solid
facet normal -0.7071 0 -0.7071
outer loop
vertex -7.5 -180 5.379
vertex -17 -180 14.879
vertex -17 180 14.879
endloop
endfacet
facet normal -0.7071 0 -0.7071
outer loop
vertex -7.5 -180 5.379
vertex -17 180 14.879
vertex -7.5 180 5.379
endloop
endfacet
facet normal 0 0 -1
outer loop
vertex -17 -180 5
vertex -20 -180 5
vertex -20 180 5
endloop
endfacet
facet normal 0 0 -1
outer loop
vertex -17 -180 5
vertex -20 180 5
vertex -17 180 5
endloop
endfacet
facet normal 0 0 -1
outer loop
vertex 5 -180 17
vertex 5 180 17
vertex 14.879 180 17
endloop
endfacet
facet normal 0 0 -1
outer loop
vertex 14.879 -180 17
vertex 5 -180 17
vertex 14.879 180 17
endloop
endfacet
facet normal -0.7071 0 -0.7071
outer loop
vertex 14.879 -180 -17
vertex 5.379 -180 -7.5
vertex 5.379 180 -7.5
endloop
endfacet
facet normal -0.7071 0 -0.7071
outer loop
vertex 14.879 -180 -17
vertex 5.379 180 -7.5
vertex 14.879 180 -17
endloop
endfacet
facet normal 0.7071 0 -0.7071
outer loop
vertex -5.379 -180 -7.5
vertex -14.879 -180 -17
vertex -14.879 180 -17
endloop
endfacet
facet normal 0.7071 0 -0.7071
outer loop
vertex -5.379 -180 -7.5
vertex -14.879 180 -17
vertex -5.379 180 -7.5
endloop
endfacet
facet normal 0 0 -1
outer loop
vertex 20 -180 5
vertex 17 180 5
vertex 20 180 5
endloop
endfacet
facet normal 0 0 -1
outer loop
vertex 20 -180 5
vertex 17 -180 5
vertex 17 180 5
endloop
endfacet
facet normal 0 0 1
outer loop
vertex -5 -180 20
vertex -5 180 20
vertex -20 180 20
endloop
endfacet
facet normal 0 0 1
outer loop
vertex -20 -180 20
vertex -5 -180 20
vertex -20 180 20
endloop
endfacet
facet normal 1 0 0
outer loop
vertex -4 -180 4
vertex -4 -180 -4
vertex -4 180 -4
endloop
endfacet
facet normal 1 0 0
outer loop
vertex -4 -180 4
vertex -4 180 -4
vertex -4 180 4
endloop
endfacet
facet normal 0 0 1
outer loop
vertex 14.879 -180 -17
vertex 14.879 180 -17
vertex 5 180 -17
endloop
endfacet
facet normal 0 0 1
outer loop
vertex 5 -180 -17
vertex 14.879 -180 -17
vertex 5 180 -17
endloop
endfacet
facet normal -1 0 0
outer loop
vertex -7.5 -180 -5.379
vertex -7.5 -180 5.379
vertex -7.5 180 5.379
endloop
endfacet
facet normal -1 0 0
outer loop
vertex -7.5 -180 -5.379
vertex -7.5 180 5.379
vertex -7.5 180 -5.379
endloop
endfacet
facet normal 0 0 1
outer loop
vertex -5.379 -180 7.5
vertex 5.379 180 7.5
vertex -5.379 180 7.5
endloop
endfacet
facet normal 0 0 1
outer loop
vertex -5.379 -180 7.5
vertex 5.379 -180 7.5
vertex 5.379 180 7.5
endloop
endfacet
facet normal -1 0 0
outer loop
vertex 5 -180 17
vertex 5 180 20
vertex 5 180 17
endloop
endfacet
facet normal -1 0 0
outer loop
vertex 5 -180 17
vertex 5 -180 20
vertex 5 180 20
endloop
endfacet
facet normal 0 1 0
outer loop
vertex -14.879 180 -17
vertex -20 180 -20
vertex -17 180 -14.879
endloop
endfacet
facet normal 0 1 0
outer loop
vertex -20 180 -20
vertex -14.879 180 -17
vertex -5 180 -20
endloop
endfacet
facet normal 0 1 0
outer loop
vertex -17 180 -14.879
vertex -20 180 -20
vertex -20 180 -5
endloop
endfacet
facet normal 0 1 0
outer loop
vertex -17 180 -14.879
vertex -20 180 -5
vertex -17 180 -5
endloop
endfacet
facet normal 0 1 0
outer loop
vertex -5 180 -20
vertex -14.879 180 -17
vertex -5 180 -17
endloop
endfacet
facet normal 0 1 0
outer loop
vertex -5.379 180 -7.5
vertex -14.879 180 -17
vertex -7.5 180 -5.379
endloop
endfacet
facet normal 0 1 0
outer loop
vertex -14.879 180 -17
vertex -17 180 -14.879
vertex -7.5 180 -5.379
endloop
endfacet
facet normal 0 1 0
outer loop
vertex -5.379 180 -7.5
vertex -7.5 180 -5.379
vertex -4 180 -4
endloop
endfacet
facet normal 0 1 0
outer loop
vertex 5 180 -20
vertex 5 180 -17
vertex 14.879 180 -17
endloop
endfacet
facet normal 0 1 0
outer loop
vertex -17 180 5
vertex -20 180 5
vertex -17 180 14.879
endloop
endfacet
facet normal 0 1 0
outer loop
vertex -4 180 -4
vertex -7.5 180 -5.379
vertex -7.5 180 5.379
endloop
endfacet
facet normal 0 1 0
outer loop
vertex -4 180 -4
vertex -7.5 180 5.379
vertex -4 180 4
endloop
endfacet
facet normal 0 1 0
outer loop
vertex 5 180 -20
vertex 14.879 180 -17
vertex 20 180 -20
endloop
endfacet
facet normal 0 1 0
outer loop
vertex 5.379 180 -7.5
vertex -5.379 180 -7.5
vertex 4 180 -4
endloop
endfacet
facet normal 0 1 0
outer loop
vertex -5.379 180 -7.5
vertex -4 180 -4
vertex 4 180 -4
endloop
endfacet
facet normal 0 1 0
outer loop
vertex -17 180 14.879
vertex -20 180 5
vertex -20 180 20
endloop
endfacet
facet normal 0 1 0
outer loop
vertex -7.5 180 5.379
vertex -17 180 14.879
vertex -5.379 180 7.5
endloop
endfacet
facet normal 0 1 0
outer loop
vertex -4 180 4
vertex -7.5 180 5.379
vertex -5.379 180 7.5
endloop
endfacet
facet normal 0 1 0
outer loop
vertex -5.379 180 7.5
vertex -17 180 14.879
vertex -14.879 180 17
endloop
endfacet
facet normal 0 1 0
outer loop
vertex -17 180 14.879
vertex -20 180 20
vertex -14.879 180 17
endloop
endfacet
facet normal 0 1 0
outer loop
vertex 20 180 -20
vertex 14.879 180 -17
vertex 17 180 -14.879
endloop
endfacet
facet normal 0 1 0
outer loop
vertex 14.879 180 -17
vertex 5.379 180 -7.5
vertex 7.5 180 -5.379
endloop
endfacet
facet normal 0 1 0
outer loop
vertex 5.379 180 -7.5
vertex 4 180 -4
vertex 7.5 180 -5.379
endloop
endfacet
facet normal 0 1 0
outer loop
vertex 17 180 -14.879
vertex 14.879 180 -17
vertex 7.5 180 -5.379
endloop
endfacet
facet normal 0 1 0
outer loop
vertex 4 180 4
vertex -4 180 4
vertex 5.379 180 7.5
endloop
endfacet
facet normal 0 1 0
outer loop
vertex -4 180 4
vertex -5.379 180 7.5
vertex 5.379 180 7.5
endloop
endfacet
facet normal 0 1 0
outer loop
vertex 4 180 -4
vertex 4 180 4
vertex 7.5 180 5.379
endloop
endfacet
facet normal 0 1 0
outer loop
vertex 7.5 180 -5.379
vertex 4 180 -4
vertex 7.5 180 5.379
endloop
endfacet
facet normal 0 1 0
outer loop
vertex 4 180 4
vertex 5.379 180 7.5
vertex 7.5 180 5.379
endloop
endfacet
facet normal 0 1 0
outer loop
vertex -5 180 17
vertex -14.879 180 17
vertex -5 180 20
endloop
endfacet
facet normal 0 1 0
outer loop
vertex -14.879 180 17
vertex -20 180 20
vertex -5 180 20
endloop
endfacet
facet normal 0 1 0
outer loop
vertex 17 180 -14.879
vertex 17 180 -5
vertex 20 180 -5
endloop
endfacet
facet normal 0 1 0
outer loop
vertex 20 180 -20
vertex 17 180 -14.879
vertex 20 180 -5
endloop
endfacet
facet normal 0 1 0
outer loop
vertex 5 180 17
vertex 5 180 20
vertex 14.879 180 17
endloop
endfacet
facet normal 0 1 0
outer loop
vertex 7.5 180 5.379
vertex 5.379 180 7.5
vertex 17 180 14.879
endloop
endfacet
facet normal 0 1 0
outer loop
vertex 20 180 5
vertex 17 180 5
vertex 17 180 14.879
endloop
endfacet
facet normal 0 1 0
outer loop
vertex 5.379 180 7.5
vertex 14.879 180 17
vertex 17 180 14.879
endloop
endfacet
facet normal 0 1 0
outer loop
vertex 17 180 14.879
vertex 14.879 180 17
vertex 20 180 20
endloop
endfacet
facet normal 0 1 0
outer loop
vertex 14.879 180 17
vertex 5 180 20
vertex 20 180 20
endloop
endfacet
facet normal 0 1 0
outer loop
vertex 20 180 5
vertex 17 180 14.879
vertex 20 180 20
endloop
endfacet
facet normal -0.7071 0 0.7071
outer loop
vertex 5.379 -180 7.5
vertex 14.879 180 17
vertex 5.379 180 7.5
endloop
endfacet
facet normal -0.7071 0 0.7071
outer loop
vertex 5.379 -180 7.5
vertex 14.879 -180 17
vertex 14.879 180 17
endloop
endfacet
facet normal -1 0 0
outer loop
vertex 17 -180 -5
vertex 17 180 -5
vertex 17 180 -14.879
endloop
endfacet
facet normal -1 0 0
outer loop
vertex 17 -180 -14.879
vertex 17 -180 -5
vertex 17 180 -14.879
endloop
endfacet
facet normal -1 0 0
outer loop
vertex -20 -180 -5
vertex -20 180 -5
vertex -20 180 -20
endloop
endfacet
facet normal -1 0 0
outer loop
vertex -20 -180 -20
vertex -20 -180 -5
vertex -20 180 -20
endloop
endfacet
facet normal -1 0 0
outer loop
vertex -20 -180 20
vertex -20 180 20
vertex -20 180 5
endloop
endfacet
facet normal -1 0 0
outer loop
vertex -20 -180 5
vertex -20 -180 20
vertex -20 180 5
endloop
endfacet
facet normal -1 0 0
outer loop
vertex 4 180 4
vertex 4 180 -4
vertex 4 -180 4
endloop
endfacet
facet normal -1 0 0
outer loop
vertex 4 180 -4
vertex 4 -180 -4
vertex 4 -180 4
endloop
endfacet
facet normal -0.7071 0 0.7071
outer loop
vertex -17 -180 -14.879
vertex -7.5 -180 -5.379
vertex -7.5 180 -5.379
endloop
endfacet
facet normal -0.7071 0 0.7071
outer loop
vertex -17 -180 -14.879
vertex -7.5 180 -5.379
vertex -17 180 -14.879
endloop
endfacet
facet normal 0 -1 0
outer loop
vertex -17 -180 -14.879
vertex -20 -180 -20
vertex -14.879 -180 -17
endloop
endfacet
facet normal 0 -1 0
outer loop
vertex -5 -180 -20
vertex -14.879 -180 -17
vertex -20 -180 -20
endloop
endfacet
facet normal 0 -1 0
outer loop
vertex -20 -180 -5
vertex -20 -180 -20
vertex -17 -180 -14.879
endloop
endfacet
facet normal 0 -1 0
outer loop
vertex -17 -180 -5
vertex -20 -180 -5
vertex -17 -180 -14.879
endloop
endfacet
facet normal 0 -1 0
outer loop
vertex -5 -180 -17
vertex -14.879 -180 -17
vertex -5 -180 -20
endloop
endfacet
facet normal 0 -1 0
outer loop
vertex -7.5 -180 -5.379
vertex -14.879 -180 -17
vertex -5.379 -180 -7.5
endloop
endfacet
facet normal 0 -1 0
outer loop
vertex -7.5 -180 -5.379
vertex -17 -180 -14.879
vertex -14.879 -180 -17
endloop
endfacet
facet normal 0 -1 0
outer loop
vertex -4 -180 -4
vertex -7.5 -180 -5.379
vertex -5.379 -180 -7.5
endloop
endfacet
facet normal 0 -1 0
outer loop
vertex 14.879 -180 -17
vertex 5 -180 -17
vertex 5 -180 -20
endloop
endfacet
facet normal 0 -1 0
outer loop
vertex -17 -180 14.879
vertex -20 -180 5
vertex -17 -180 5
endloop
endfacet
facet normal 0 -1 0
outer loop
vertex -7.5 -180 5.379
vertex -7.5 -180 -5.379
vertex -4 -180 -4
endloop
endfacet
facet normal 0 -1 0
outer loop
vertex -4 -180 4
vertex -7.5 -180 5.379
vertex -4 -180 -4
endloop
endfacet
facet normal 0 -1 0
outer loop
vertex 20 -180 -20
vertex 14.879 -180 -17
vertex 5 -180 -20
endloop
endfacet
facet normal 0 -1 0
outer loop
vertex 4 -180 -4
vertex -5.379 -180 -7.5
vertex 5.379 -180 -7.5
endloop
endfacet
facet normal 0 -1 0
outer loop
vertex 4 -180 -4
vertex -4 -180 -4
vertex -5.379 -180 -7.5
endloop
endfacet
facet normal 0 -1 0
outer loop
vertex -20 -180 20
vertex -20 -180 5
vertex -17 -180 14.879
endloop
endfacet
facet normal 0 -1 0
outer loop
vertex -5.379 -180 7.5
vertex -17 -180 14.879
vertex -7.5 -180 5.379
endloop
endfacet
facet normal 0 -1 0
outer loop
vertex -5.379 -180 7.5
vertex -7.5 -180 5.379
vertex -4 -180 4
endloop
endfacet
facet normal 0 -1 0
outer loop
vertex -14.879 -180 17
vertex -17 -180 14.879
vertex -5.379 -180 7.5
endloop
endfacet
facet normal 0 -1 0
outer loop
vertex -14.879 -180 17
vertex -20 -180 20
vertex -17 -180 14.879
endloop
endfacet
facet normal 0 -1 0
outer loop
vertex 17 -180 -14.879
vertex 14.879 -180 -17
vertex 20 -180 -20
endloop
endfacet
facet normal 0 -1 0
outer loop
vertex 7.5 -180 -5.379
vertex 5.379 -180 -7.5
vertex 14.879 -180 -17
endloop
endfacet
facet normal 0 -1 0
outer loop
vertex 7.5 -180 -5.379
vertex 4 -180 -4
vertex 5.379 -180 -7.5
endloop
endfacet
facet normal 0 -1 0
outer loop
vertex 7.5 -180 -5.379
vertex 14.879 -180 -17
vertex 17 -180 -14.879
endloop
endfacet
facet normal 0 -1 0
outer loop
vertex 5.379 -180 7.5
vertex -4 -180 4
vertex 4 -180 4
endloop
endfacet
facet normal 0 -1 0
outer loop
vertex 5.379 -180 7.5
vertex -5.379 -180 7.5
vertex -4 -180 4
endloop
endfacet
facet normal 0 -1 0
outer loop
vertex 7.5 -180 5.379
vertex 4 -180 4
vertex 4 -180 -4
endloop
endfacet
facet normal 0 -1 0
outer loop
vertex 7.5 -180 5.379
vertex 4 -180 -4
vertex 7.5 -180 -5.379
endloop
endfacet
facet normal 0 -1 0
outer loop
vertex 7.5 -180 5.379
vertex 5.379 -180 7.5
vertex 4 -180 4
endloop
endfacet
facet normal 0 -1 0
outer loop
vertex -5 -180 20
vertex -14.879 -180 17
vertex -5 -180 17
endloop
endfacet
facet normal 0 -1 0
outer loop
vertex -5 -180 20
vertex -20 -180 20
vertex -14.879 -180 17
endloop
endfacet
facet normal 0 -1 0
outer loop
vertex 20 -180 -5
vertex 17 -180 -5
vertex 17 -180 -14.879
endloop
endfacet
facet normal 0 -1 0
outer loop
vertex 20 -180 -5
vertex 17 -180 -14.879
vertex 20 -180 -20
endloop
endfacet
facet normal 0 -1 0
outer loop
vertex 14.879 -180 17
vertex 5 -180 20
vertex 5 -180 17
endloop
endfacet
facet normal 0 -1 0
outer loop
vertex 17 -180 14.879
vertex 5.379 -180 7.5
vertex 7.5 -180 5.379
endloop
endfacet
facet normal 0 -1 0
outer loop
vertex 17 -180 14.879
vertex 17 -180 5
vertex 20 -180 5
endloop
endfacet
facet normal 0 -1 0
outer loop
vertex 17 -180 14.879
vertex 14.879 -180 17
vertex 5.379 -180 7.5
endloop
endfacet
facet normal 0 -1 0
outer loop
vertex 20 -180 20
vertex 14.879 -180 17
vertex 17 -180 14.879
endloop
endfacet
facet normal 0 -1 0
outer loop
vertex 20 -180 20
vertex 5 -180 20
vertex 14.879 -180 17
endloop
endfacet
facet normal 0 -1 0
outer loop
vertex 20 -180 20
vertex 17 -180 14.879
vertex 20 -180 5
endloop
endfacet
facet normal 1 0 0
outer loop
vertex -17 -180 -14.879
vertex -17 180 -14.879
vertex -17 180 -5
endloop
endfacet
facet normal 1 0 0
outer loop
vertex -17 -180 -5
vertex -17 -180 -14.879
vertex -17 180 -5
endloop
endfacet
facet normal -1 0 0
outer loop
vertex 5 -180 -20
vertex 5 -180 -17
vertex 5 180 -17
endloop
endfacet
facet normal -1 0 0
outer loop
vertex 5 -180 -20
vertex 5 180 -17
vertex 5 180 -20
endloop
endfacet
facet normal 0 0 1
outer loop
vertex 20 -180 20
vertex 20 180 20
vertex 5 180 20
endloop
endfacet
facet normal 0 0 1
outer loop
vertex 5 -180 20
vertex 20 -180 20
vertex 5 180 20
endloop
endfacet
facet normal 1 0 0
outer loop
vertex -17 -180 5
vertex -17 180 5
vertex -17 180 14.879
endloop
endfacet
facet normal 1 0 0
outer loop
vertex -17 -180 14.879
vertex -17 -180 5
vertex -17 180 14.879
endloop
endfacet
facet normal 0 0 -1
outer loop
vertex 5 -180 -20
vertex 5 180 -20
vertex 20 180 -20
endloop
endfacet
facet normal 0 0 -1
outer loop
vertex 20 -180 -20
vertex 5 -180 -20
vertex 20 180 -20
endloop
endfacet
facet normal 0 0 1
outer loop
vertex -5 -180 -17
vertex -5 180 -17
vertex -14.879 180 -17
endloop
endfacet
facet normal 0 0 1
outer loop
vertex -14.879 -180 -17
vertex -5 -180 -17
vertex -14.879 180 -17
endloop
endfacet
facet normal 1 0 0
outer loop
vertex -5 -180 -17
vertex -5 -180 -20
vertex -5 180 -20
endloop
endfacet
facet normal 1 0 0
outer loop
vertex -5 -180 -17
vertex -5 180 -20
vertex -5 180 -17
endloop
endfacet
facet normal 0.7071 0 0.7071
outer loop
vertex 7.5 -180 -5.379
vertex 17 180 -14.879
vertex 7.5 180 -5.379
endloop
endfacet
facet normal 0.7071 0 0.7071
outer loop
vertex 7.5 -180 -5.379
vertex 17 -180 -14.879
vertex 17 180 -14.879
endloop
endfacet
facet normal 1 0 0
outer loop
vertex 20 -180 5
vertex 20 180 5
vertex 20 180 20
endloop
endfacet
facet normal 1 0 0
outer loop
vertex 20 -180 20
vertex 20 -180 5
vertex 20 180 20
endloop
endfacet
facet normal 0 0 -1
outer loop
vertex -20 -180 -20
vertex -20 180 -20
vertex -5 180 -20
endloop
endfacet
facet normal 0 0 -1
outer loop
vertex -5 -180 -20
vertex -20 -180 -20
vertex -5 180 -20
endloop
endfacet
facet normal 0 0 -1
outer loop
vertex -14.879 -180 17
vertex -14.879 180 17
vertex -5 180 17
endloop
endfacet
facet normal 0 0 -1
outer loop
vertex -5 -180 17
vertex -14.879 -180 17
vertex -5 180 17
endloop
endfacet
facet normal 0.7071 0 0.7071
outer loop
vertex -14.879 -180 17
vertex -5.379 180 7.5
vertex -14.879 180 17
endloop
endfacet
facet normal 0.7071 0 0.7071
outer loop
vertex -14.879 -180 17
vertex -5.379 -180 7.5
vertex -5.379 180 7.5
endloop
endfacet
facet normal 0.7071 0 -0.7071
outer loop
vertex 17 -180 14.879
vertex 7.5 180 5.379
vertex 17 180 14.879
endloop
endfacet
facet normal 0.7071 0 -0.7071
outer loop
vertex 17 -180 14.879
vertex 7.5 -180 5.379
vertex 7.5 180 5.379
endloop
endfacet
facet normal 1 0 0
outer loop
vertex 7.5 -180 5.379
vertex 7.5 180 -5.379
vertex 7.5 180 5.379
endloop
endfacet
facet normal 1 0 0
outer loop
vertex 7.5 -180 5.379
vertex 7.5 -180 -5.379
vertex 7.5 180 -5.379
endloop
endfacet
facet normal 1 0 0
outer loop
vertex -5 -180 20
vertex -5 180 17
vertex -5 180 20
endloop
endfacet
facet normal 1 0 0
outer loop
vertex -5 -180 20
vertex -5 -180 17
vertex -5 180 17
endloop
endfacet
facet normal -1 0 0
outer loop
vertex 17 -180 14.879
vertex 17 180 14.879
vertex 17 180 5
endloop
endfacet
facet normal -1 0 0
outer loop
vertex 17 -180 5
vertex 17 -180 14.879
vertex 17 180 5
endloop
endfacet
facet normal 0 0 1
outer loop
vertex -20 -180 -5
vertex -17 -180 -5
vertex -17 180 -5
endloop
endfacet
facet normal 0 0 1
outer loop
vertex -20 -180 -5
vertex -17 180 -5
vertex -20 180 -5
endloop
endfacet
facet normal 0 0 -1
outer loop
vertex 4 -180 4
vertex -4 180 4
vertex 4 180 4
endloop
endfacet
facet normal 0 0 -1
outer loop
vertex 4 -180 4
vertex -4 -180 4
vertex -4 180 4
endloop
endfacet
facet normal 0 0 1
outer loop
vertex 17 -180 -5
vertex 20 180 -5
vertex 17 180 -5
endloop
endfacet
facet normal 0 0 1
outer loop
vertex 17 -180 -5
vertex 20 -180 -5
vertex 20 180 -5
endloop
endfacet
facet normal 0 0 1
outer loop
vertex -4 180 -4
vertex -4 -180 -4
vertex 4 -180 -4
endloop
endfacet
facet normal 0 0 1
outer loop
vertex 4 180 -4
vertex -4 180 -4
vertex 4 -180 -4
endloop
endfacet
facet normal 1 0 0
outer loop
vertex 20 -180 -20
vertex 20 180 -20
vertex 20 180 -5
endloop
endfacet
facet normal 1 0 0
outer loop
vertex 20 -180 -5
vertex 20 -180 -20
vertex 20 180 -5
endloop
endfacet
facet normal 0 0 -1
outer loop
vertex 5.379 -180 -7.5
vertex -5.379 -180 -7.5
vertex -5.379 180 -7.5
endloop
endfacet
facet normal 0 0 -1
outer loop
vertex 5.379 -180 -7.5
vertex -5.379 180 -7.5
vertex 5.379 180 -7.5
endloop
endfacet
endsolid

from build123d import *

# Parameters (mm, degrees)
F0_W     = 8
F0_H     = 8
F1_DEPTH = 180


with BuildPart() as f1:
    # F0 (on Front) → F1 (new body, symmetric)
    with BuildSketch(Plane.XZ):
        Polygon((-5, 17), (-5, 20), (-20, 20), (-20, 5), (-17, 5), (-17, 14.87868), (-17, 17), (-14.87868, 17), align=None)
        Polygon((-17, -5), (-20, -5), (-20, -20), (-5, -20), (-5, -17), (-14.87868, -17), (-17, -17), (-17, -14.87868), align=None)
        Polygon((20, -20), (20, -5), (17, -5), (17, -14.87868), (17, -17), (14.87868, -17), (5, -17), (5, -20), align=None)
        Polygon((20, 5), (20, 20), (5, 20), (5, 17), (14.87868, 17), (17, 17), (17, 14.87868), (17, 5), align=None)
        Polygon((17, 17), (14.87868, 17), (5.37868, 7.5), (7.5, 7.5), (7.5, 5.37868), (17, 14.87868), align=None)
        Polygon((-5.37868, 7.5), (-14.87868, 17), (-17, 17), (-17, 14.87868), (-7.5, 5.37868), (-7.5, 7.5), align=None)
        Polygon((-7.5, -5.37868), (-17, -14.87868), (-17, -17), (-14.87868, -17), (-5.37868, -7.5), (-7.5, -7.5), align=None)
        Polygon((17, -17), (17, -14.87868), (7.5, -5.37868), (7.5, -7.5), (5.37868, -7.5), (14.87868, -17), align=None)
        Polygon((7.5, 7.5), (5.37868, 7.5), (-5.37868, 7.5), (-7.5, 7.5), (-7.5, 5.37868), (-7.5, -5.37868), (-7.5, -7.5), (-5.37868, -7.5), (5.37868, -7.5), (7.5, -7.5), (7.5, -5.37868), (7.5, 5.37868), align=None)
        Rectangle(F0_W, F0_H, mode=Mode.SUBTRACT)
    extrude(amount=F1_DEPTH, both=True)


solid = f1.part
